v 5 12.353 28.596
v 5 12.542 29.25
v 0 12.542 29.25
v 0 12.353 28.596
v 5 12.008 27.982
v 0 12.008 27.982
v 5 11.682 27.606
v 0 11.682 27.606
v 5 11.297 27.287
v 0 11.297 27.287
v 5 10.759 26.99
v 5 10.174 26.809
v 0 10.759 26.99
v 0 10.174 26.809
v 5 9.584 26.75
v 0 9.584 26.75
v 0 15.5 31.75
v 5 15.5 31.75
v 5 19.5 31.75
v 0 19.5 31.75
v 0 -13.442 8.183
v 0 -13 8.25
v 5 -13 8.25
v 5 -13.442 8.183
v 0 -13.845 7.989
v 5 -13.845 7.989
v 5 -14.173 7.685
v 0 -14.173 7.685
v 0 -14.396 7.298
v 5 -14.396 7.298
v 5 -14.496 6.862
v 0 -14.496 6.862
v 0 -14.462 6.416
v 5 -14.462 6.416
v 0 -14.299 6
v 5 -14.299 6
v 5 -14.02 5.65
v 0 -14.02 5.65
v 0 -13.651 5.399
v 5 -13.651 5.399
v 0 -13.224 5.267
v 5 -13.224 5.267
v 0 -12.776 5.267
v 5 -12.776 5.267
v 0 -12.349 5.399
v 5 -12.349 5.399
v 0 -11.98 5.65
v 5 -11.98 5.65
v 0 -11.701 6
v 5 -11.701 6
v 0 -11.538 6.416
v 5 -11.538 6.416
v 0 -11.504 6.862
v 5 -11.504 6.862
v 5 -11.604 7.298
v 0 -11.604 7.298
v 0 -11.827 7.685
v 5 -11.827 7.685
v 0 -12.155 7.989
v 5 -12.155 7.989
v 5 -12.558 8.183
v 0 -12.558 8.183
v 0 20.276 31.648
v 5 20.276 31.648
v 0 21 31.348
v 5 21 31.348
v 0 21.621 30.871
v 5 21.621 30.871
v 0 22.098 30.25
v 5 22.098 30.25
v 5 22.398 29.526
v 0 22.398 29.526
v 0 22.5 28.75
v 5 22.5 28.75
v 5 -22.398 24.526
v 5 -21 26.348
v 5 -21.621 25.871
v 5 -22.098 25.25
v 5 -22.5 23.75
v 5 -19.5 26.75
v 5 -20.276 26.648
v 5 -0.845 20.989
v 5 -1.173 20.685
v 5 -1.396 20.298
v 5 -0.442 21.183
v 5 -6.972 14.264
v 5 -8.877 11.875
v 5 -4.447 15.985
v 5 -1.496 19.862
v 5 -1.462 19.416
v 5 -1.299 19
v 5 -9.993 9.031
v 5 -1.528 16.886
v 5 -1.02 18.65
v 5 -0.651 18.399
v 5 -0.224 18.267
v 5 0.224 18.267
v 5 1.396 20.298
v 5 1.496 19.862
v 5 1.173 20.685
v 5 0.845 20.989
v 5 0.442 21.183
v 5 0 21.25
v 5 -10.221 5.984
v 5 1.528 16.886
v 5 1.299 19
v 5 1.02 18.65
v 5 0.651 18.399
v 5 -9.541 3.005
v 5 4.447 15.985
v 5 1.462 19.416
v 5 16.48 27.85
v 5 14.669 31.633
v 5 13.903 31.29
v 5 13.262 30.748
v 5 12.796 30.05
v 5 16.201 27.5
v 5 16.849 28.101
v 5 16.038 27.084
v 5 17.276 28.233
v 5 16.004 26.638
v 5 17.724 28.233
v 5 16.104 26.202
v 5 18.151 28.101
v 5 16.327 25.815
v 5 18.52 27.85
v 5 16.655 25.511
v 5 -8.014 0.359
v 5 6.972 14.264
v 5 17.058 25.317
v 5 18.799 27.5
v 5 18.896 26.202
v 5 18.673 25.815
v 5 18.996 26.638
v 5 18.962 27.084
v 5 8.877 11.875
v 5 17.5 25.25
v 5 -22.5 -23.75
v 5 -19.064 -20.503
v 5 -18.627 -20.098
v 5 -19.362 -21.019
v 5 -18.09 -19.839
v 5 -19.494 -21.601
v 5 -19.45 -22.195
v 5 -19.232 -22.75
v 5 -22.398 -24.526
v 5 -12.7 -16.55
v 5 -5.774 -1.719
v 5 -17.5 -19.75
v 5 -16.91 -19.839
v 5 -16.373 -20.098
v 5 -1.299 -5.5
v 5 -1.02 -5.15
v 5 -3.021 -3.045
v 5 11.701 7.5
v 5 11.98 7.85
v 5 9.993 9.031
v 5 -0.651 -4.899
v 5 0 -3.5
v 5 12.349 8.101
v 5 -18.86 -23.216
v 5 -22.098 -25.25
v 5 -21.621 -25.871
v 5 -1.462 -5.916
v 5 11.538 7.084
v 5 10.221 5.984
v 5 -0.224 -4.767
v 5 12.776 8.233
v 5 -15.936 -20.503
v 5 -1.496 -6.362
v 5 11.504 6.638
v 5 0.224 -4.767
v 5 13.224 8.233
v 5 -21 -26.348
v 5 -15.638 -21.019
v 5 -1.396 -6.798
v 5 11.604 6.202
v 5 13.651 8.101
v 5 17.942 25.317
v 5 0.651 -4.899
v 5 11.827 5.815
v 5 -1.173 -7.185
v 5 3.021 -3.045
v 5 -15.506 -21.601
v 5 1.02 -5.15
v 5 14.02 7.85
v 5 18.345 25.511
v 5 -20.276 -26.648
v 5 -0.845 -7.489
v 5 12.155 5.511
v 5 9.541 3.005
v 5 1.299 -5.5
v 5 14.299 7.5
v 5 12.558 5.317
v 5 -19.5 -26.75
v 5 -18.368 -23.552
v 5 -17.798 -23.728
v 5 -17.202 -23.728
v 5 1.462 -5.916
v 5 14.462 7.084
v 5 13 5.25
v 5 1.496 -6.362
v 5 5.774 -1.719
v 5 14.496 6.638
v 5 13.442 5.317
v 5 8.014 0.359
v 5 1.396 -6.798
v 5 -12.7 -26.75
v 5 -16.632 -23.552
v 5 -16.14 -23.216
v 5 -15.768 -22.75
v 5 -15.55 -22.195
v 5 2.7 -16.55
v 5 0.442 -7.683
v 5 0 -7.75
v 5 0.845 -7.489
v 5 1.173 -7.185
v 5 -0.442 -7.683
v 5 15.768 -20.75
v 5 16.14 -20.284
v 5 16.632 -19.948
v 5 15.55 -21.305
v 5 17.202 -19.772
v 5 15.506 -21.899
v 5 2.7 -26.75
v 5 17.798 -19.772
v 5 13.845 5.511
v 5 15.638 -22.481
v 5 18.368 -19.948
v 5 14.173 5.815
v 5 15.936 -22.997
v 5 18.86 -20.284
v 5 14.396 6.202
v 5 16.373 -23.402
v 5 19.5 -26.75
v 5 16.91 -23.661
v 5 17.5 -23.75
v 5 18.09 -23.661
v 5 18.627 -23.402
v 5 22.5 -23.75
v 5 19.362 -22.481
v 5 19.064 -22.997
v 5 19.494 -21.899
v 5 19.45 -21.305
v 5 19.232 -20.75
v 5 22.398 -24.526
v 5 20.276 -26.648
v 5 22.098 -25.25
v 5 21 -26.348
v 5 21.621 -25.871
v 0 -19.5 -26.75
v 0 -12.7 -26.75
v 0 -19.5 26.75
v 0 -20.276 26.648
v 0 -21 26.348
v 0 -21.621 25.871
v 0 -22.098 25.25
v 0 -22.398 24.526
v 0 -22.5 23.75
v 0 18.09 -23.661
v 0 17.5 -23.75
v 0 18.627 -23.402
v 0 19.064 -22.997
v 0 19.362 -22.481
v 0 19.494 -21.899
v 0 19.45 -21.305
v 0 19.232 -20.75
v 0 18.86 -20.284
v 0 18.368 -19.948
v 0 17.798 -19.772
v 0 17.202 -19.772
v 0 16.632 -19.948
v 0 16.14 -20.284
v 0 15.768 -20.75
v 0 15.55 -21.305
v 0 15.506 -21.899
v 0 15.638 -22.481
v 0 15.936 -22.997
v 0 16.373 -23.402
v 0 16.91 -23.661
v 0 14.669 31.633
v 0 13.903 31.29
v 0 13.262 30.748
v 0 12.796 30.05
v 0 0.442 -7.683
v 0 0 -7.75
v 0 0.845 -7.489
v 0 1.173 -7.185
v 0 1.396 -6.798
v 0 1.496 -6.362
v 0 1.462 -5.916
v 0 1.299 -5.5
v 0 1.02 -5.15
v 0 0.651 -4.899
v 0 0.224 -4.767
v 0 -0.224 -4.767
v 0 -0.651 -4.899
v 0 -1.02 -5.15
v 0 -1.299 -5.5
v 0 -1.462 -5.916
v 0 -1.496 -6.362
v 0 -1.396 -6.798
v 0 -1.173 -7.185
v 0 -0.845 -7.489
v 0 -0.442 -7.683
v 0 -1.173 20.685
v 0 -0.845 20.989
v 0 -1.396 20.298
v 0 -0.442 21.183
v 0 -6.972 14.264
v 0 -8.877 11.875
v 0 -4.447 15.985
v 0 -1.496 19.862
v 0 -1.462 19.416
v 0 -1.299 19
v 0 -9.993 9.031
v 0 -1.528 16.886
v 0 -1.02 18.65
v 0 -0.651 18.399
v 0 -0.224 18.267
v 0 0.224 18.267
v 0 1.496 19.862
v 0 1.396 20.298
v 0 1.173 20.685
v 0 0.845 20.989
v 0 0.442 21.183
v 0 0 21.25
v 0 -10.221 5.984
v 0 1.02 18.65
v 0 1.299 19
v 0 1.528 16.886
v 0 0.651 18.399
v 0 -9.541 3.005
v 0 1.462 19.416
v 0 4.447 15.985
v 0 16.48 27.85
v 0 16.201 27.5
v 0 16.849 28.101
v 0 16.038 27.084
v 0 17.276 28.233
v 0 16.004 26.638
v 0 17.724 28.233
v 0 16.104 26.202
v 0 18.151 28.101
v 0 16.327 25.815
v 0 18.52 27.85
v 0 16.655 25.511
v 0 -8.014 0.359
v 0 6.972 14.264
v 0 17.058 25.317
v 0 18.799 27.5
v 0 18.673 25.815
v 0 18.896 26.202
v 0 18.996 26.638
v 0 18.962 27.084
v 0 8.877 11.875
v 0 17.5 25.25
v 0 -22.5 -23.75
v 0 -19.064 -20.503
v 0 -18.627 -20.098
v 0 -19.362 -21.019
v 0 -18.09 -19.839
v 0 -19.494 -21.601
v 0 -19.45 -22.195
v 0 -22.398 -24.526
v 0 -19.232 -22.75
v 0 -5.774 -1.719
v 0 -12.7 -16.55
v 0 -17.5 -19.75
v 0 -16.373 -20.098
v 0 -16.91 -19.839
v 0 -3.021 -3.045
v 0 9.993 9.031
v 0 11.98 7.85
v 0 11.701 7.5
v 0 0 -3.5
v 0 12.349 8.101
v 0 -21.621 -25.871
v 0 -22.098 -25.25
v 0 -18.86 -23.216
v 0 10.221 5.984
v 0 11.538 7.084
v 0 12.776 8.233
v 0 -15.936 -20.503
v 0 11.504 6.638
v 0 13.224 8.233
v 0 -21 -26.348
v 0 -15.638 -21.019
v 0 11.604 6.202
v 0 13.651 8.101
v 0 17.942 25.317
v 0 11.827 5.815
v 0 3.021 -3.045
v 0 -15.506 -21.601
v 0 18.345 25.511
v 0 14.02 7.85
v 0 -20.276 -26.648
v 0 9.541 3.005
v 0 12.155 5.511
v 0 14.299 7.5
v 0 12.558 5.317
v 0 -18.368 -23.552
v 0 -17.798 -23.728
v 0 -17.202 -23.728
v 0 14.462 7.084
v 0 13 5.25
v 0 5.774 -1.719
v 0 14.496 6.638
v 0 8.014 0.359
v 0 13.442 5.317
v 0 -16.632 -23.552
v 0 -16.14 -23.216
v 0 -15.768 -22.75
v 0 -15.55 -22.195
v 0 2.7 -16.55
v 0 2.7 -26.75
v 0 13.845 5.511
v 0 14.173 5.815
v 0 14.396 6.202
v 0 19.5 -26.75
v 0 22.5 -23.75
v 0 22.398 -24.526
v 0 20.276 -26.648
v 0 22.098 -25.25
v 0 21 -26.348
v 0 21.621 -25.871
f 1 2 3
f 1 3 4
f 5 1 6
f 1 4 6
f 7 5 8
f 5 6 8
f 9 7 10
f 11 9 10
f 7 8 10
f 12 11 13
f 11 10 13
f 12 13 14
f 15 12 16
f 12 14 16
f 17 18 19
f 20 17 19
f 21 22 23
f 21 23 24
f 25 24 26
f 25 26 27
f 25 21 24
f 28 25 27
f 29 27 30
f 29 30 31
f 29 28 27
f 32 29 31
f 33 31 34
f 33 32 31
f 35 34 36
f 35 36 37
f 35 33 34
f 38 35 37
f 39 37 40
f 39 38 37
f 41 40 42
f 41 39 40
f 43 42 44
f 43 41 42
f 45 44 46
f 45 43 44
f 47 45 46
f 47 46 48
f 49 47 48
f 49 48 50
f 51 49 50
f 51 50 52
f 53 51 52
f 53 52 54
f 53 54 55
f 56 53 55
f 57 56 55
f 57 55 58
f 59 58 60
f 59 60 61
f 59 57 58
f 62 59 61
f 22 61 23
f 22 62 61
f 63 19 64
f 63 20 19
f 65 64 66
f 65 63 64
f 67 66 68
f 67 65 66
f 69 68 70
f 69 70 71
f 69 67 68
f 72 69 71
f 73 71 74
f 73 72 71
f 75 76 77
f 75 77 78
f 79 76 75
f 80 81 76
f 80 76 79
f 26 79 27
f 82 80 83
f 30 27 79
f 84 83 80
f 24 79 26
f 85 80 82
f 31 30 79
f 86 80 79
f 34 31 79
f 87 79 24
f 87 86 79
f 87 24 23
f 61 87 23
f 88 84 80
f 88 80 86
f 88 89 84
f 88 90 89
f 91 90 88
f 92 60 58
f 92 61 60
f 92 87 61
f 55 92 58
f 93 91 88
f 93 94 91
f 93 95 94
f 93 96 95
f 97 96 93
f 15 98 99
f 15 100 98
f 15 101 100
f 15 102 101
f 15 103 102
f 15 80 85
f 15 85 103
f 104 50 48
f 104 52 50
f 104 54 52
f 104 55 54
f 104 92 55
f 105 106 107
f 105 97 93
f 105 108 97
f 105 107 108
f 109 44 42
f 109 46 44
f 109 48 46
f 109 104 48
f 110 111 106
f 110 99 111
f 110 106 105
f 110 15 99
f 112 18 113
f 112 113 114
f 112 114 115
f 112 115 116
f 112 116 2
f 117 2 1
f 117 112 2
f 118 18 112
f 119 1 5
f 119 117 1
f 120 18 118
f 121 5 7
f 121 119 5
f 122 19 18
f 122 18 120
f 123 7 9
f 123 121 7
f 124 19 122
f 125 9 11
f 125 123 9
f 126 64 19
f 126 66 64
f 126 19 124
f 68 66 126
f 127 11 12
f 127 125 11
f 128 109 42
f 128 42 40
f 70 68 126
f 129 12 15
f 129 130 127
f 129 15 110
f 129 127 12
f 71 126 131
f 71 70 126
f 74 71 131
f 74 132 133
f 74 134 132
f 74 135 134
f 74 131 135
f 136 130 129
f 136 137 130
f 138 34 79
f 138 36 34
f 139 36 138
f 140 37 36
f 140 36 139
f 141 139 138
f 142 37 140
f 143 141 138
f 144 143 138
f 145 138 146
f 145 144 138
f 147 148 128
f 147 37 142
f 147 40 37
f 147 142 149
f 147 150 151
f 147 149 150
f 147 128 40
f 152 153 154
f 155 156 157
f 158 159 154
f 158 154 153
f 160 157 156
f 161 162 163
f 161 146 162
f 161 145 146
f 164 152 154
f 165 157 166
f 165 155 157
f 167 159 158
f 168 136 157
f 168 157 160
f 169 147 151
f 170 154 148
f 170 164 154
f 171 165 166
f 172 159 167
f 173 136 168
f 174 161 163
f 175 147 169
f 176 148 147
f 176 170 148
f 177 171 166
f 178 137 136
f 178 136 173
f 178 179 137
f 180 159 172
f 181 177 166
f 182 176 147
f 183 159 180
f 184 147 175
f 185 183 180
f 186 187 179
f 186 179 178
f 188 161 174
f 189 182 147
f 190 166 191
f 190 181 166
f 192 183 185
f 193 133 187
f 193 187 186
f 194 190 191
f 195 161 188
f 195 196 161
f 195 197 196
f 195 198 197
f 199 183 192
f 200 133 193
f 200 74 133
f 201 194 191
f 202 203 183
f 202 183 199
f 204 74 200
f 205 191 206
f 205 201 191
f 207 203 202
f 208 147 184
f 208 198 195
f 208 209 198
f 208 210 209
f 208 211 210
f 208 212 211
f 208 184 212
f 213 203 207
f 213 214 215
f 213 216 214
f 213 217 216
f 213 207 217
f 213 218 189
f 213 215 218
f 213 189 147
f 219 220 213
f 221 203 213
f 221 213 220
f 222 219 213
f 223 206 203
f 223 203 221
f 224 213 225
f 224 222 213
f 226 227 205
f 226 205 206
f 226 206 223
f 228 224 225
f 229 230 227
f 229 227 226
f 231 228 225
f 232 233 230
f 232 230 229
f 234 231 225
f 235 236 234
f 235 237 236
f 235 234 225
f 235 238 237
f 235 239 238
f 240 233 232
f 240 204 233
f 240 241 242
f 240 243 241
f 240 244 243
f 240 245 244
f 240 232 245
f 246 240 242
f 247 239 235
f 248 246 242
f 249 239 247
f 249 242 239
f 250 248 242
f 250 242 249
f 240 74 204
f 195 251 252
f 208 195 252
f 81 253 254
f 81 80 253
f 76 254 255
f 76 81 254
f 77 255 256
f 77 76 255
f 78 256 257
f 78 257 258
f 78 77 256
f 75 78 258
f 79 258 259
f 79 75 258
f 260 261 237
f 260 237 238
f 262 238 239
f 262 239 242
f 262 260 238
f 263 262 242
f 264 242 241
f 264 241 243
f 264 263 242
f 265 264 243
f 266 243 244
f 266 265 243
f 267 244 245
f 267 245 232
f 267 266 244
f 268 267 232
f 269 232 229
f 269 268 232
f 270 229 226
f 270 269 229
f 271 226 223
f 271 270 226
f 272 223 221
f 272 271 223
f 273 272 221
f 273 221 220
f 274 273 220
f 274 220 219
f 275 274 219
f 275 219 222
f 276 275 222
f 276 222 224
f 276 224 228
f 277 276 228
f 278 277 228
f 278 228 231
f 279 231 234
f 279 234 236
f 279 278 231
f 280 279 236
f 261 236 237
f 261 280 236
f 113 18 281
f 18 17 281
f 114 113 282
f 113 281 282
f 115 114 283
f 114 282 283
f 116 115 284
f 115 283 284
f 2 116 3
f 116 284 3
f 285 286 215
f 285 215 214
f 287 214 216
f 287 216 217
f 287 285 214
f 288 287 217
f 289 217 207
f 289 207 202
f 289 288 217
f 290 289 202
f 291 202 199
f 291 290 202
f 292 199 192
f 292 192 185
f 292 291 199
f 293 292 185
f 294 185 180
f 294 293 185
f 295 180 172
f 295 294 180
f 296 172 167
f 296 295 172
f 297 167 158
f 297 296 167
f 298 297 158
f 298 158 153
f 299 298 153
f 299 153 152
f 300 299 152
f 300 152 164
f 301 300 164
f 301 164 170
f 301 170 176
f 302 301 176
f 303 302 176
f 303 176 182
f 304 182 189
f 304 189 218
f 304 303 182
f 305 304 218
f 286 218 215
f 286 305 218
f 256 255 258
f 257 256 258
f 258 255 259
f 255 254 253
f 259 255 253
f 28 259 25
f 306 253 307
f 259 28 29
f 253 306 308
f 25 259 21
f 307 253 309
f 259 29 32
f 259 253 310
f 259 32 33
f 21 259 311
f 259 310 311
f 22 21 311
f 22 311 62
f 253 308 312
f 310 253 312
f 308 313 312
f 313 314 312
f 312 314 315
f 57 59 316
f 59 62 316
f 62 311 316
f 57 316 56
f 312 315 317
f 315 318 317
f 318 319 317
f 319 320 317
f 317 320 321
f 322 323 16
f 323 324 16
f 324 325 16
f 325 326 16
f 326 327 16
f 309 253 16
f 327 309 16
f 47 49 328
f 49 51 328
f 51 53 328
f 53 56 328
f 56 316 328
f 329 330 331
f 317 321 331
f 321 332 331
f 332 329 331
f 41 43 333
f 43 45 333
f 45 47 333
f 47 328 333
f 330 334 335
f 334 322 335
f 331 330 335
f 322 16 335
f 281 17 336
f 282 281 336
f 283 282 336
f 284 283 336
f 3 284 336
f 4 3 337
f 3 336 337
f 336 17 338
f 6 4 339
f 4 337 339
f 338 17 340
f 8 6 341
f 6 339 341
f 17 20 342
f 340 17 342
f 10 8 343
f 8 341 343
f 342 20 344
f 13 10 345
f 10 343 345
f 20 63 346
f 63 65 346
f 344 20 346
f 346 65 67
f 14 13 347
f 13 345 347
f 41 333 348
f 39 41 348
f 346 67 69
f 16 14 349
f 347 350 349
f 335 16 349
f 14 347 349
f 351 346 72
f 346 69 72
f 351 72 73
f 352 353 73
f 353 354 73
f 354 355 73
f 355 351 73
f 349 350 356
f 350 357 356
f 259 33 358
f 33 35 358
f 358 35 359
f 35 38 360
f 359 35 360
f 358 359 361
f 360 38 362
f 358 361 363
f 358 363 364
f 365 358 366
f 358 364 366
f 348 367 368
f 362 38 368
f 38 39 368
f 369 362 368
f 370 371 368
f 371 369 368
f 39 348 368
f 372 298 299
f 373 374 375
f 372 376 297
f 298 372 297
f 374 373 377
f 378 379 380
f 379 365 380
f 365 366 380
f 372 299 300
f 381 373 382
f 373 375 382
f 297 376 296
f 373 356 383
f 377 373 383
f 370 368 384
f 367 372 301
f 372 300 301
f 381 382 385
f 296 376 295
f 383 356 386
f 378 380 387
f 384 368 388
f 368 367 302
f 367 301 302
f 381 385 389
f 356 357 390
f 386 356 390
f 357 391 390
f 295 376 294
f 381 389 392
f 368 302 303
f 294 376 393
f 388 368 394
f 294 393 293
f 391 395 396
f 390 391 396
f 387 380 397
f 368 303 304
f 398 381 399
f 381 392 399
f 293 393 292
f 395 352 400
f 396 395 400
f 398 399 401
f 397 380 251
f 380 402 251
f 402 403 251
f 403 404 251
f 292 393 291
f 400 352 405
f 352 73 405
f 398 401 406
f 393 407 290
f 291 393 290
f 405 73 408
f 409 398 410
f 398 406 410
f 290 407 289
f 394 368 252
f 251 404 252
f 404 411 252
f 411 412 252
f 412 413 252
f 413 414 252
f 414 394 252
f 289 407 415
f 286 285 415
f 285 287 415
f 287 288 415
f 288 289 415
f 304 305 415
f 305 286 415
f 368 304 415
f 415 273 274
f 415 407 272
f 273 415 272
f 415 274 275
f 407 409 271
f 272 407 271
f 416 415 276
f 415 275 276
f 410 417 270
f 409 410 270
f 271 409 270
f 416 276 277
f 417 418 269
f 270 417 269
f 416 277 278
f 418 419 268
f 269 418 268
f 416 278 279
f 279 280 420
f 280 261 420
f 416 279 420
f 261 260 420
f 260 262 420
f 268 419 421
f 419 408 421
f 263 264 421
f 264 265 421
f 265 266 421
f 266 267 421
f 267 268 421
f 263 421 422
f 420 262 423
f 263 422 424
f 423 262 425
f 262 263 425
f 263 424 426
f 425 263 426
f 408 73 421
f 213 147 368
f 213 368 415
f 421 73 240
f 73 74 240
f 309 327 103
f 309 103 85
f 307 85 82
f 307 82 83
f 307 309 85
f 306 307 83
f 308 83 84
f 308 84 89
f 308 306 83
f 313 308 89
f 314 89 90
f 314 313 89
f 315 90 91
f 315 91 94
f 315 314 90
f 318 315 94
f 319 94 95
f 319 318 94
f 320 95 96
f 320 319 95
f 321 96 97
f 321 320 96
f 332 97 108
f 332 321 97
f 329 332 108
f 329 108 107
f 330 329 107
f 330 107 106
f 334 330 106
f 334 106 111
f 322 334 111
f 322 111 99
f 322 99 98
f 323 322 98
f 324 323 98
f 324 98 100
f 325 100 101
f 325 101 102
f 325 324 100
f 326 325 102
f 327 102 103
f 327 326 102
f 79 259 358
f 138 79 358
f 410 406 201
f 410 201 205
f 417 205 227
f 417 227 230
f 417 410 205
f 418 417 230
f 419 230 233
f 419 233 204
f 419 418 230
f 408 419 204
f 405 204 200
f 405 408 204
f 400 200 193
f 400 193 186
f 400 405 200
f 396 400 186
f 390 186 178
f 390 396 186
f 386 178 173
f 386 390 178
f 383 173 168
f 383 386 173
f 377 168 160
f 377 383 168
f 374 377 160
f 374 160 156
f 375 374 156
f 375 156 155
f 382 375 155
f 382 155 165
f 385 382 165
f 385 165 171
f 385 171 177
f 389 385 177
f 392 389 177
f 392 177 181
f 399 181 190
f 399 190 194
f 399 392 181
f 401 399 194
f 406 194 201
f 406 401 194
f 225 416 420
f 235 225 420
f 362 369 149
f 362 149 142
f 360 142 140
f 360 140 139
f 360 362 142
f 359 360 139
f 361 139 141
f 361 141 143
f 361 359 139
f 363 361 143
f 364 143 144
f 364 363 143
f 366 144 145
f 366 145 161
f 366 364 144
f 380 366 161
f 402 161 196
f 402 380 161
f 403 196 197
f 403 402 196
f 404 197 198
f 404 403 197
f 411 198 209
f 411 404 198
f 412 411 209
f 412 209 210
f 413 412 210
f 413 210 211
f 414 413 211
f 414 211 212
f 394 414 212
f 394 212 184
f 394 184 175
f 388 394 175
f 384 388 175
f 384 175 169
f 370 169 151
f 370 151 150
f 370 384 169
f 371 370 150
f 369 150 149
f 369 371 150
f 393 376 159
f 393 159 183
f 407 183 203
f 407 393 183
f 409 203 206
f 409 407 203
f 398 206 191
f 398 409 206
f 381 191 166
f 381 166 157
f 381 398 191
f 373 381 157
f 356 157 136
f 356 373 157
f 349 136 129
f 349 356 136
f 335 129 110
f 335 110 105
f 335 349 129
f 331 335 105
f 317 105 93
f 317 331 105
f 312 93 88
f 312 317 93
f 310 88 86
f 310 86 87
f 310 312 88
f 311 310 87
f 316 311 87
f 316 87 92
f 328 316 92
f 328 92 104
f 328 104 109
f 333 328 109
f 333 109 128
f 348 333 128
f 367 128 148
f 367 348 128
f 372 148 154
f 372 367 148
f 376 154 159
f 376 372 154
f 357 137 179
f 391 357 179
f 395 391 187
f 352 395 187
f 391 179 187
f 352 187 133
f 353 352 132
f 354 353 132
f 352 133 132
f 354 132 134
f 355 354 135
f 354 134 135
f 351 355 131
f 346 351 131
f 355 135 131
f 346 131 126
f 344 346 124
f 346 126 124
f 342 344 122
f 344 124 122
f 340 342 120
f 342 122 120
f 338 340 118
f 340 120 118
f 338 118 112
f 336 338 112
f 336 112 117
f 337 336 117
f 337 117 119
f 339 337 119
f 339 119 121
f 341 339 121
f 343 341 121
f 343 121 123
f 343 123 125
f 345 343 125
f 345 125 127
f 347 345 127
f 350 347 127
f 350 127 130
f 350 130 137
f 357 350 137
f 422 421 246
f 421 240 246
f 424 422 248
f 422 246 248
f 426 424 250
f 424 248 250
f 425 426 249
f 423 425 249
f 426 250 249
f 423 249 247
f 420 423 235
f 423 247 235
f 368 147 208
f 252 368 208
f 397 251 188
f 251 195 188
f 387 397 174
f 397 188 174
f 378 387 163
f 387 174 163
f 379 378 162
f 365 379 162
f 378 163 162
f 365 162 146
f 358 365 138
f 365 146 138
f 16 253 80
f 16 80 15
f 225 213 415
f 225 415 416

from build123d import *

# Parameters (mm, degrees)
SKETCH_1_W          = 53.5
SKETCH_1_H          = 45
SKETCH_1_R          = 10.25
SKETCH_1_R_2        = 2
SKETCH_1_R_3        = 1.5
EXTRUDE_1_DEPTH     = 5
SKETCH_3_W          = 5
SKETCH_3_H          = 10
EXTRUDE_2_DEPTH     = 5
SKETCH_4_R          = 1.5
SKETCH_4_W          = 10.4
SKETCH_4_H          = 15.4
CUT_EXTRUDE_2_DEPTH = 40.234073202
FILLET_1_R          = 3
FILLET_2_R          = 3


with BuildPart() as part:
    # ｽｹｯﾁ1 → ﾎﾞｽ - 押し出し1 (new body)
    with BuildSketch(Plane(origin=(0, 0, 0), x_dir=(0, 0, -1), z_dir=(1, 0, 0))):
        Rectangle(SKETCH_1_W, SKETCH_1_H)
        with Locations((-6.75, 0)):
            Circle(SKETCH_1_R, mode=Mode.SUBTRACT)
        with Locations((21.75, 17.5)):
            Circle(SKETCH_1_R_2, mode=Mode.SUBTRACT)
        with Locations(Location((21.75, -17.5, 0), (0, 0, 180))):
            Circle(SKETCH_1_R_2, mode=Mode.SUBTRACT)
        with Locations((6.25, 0)):
            Circle(SKETCH_1_R_3, mode=Mode.SUBTRACT)
        with Locations(Location((-19.75, 0, 0), (0, 0, 180))):
            Circle(SKETCH_1_R_3, mode=Mode.SUBTRACT)
        with Locations((-6.75, 13)):
            Circle(SKETCH_1_R_3, mode=Mode.SUBTRACT)
        with Locations(Location((-6.75, -13, 0), (0, 0, 180))):
            Circle(SKETCH_1_R_3, mode=Mode.SUBTRACT)
    extrude(amount=EXTRUDE_1_DEPTH)

    # ｽｹｯﾁ3 → ﾎﾞｽ - 押し出し2 (add)
    with BuildSketch(Plane(origin=(5, 0, 0), x_dir=(0, 0, -1), z_dir=(1, 0, 0))):
        with Locations((-29.25, 17.5)):
            Rectangle(SKETCH_3_W, SKETCH_3_H)
    extrude(amount=-EXTRUDE_2_DEPTH)

    # ｽｹｯﾁ4 → ｶｯﾄ - 押し出し2 (cut, through all)
    with BuildSketch(Plane(origin=(5, 0, 0), x_dir=(0, 0, -1), z_dir=(1, 0, 0))):
        with Locations((-26.75, 17.5)):
            Circle(SKETCH_4_R)
        with Locations((21.75, -5)):
            Rectangle(SKETCH_4_W, SKETCH_4_H)
    extrude(amount=-CUT_EXTRUDE_2_DEPTH, mode=Mode.SUBTRACT)

    # ﾌｨﾚｯﾄ1
    fillet_1_edges = [part.edges().sort_by_distance(p)[0] for p in [
        (2.5, 22.5, 31.75),
        (2.5, 12.5, 31.75),
        (2.5, -22.5, -26.75),
        (2.5, -22.5, 26.75),
        (2.5, 22.5, -26.75),
    ]]
    fillet(fillet_1_edges, radius=FILLET_1_R)

    # ﾌｨﾚｯﾄ2
    fillet_2_edges = [part.edges().sort_by_distance(p)[0] for p in [
        (2.5, 12.5, 26.75),
    ]]
    fillet(fillet_2_edges, radius=FILLET_2_R)


solid = part.part
